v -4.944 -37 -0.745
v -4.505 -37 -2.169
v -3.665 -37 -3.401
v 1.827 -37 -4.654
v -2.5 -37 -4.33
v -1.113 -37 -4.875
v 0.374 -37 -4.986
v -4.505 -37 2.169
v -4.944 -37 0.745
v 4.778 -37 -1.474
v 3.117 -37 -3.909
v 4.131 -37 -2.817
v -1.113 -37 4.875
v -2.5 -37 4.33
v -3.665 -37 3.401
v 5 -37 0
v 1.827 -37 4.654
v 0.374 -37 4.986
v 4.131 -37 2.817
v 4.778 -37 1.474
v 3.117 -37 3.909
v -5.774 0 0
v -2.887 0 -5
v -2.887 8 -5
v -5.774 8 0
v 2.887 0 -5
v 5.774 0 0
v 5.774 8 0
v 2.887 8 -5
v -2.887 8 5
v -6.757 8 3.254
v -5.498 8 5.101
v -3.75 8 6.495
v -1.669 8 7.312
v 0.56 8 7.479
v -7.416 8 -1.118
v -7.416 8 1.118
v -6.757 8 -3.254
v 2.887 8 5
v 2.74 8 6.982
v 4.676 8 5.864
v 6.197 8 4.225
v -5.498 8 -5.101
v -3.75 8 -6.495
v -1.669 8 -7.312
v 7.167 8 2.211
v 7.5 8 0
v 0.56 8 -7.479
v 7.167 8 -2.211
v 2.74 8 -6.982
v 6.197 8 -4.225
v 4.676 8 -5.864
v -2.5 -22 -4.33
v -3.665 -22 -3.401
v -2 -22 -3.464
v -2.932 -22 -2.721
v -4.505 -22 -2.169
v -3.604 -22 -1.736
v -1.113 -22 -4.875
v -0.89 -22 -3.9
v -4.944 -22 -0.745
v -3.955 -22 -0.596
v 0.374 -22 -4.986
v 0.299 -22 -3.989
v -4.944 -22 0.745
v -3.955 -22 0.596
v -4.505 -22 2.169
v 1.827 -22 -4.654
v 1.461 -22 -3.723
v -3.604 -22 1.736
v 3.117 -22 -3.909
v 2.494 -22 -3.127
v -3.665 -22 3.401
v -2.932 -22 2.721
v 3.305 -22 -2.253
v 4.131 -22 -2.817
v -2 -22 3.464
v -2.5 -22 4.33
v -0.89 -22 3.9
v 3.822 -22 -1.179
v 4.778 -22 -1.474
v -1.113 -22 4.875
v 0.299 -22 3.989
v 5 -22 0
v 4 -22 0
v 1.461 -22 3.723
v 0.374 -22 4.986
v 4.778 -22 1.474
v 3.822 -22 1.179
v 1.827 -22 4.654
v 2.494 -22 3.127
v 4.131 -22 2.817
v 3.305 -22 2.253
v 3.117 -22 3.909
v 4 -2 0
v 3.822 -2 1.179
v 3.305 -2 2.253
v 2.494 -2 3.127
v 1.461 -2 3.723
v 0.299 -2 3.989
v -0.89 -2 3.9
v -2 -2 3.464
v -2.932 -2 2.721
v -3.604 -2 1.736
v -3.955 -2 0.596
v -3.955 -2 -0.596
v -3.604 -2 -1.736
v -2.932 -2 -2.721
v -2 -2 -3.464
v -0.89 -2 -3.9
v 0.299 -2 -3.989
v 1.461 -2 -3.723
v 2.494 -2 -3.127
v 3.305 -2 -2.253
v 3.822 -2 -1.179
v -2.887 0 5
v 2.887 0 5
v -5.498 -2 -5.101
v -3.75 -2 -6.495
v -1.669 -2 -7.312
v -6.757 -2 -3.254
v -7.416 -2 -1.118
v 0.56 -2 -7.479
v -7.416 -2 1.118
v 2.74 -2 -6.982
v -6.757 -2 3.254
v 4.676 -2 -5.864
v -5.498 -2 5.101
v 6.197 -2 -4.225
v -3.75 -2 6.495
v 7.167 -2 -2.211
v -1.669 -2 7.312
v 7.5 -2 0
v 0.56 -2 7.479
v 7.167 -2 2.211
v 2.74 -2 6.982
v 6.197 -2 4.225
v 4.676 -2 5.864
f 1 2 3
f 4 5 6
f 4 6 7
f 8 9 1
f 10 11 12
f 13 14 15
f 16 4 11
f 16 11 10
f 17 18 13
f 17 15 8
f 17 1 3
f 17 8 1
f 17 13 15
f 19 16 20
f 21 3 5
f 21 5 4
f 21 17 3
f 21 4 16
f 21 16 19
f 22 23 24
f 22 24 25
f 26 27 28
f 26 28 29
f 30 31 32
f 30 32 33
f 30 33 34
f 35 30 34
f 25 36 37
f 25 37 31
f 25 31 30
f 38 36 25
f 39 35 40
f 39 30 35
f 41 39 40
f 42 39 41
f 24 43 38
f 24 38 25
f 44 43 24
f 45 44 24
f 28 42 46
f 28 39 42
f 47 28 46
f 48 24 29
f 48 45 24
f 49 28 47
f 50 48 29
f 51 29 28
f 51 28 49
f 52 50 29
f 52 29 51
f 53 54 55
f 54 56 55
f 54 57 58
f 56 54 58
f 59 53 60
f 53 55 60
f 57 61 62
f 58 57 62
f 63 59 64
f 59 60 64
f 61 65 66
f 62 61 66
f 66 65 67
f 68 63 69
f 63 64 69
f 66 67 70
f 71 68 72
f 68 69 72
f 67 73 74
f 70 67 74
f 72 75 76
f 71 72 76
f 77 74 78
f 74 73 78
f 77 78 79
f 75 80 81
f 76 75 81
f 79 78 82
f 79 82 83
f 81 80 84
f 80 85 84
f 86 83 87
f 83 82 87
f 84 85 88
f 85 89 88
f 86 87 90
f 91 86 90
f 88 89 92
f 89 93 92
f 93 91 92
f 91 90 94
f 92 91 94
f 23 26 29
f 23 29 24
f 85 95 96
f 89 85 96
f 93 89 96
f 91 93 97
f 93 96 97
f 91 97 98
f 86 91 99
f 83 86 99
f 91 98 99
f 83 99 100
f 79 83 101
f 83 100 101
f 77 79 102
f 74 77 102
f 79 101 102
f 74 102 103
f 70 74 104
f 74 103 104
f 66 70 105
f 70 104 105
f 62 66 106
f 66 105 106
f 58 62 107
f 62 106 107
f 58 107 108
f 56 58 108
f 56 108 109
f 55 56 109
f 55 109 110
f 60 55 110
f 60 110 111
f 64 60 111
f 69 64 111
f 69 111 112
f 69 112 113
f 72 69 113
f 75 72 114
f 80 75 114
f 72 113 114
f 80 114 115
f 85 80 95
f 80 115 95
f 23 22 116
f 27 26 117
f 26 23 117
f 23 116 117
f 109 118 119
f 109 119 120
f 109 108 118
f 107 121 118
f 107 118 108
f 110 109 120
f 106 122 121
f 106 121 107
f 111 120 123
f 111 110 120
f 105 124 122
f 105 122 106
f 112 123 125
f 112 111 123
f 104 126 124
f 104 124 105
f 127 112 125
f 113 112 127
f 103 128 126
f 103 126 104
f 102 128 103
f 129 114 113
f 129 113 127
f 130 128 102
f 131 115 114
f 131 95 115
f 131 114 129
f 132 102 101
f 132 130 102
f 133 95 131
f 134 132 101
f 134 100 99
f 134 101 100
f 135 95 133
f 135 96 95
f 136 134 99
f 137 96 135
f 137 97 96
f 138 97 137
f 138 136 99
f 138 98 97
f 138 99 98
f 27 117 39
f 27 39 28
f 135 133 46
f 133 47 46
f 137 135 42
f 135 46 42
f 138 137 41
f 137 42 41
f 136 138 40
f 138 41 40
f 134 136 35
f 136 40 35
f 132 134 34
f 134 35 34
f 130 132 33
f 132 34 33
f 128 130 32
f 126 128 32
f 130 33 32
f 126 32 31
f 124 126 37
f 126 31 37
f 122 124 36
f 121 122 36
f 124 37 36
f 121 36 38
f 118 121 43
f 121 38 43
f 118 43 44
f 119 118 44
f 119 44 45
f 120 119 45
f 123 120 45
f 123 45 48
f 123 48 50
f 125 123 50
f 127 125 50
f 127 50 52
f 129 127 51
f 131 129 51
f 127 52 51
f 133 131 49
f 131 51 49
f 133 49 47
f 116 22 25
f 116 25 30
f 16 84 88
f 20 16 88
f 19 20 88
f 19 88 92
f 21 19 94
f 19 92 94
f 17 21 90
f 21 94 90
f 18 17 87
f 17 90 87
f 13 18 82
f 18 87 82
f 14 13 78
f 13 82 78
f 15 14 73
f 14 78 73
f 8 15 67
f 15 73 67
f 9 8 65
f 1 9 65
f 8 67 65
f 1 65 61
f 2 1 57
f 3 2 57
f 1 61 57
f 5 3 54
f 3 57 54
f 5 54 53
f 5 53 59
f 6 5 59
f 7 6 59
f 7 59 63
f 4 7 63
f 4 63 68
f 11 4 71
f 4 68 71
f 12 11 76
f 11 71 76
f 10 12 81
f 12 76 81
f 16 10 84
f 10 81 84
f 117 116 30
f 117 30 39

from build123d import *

# Parameters (mm, degrees)
SKETCH1_R           = 7.5
BOSS_EXTRUDE1_DEPTH = 8
SKETCH2_R           = 7.5
BOSS_EXTRUDE2_DEPTH = 2
SKETCH3_R           = 4
BOSS_EXTRUDE3_DEPTH = 20
SKETCH4_R           = 5
BOSS_EXTRUDE4_DEPTH = 15


with BuildPart() as part:
    # Sketch1 → Boss-Extrude1 (new body)
    with BuildSketch(Plane(origin=(0, 0, 0), x_dir=(1, 0, 0), z_dir=(0, 1, 0))):
        Circle(SKETCH1_R)
        Polygon((5.773502692, 0), (2.886751346, 5), (-2.886751346, 5), (-5.773502692, 0), (-2.886751346, -5), (2.886751346, -5), align=None, mode=Mode.SUBTRACT)
    extrude(amount=BOSS_EXTRUDE1_DEPTH)

    # Sketch2 → Boss-Extrude2 (add)
    with BuildSketch(Plane.XZ):
        Circle(SKETCH2_R)
    extrude(amount=BOSS_EXTRUDE2_DEPTH)

    # Sketch3 → Boss-Extrude3 (add)
    with BuildSketch(Plane.XZ.offset(2)):
        Circle(SKETCH3_R)
    extrude(amount=BOSS_EXTRUDE3_DEPTH)

    # Sketch4 → Boss-Extrude4 (add)
    with BuildSketch(Plane.XZ.offset(22)):
        Circle(SKETCH4_R)
    extrude(amount=BOSS_EXTRUDE4_DEPTH)


solid = part.part
